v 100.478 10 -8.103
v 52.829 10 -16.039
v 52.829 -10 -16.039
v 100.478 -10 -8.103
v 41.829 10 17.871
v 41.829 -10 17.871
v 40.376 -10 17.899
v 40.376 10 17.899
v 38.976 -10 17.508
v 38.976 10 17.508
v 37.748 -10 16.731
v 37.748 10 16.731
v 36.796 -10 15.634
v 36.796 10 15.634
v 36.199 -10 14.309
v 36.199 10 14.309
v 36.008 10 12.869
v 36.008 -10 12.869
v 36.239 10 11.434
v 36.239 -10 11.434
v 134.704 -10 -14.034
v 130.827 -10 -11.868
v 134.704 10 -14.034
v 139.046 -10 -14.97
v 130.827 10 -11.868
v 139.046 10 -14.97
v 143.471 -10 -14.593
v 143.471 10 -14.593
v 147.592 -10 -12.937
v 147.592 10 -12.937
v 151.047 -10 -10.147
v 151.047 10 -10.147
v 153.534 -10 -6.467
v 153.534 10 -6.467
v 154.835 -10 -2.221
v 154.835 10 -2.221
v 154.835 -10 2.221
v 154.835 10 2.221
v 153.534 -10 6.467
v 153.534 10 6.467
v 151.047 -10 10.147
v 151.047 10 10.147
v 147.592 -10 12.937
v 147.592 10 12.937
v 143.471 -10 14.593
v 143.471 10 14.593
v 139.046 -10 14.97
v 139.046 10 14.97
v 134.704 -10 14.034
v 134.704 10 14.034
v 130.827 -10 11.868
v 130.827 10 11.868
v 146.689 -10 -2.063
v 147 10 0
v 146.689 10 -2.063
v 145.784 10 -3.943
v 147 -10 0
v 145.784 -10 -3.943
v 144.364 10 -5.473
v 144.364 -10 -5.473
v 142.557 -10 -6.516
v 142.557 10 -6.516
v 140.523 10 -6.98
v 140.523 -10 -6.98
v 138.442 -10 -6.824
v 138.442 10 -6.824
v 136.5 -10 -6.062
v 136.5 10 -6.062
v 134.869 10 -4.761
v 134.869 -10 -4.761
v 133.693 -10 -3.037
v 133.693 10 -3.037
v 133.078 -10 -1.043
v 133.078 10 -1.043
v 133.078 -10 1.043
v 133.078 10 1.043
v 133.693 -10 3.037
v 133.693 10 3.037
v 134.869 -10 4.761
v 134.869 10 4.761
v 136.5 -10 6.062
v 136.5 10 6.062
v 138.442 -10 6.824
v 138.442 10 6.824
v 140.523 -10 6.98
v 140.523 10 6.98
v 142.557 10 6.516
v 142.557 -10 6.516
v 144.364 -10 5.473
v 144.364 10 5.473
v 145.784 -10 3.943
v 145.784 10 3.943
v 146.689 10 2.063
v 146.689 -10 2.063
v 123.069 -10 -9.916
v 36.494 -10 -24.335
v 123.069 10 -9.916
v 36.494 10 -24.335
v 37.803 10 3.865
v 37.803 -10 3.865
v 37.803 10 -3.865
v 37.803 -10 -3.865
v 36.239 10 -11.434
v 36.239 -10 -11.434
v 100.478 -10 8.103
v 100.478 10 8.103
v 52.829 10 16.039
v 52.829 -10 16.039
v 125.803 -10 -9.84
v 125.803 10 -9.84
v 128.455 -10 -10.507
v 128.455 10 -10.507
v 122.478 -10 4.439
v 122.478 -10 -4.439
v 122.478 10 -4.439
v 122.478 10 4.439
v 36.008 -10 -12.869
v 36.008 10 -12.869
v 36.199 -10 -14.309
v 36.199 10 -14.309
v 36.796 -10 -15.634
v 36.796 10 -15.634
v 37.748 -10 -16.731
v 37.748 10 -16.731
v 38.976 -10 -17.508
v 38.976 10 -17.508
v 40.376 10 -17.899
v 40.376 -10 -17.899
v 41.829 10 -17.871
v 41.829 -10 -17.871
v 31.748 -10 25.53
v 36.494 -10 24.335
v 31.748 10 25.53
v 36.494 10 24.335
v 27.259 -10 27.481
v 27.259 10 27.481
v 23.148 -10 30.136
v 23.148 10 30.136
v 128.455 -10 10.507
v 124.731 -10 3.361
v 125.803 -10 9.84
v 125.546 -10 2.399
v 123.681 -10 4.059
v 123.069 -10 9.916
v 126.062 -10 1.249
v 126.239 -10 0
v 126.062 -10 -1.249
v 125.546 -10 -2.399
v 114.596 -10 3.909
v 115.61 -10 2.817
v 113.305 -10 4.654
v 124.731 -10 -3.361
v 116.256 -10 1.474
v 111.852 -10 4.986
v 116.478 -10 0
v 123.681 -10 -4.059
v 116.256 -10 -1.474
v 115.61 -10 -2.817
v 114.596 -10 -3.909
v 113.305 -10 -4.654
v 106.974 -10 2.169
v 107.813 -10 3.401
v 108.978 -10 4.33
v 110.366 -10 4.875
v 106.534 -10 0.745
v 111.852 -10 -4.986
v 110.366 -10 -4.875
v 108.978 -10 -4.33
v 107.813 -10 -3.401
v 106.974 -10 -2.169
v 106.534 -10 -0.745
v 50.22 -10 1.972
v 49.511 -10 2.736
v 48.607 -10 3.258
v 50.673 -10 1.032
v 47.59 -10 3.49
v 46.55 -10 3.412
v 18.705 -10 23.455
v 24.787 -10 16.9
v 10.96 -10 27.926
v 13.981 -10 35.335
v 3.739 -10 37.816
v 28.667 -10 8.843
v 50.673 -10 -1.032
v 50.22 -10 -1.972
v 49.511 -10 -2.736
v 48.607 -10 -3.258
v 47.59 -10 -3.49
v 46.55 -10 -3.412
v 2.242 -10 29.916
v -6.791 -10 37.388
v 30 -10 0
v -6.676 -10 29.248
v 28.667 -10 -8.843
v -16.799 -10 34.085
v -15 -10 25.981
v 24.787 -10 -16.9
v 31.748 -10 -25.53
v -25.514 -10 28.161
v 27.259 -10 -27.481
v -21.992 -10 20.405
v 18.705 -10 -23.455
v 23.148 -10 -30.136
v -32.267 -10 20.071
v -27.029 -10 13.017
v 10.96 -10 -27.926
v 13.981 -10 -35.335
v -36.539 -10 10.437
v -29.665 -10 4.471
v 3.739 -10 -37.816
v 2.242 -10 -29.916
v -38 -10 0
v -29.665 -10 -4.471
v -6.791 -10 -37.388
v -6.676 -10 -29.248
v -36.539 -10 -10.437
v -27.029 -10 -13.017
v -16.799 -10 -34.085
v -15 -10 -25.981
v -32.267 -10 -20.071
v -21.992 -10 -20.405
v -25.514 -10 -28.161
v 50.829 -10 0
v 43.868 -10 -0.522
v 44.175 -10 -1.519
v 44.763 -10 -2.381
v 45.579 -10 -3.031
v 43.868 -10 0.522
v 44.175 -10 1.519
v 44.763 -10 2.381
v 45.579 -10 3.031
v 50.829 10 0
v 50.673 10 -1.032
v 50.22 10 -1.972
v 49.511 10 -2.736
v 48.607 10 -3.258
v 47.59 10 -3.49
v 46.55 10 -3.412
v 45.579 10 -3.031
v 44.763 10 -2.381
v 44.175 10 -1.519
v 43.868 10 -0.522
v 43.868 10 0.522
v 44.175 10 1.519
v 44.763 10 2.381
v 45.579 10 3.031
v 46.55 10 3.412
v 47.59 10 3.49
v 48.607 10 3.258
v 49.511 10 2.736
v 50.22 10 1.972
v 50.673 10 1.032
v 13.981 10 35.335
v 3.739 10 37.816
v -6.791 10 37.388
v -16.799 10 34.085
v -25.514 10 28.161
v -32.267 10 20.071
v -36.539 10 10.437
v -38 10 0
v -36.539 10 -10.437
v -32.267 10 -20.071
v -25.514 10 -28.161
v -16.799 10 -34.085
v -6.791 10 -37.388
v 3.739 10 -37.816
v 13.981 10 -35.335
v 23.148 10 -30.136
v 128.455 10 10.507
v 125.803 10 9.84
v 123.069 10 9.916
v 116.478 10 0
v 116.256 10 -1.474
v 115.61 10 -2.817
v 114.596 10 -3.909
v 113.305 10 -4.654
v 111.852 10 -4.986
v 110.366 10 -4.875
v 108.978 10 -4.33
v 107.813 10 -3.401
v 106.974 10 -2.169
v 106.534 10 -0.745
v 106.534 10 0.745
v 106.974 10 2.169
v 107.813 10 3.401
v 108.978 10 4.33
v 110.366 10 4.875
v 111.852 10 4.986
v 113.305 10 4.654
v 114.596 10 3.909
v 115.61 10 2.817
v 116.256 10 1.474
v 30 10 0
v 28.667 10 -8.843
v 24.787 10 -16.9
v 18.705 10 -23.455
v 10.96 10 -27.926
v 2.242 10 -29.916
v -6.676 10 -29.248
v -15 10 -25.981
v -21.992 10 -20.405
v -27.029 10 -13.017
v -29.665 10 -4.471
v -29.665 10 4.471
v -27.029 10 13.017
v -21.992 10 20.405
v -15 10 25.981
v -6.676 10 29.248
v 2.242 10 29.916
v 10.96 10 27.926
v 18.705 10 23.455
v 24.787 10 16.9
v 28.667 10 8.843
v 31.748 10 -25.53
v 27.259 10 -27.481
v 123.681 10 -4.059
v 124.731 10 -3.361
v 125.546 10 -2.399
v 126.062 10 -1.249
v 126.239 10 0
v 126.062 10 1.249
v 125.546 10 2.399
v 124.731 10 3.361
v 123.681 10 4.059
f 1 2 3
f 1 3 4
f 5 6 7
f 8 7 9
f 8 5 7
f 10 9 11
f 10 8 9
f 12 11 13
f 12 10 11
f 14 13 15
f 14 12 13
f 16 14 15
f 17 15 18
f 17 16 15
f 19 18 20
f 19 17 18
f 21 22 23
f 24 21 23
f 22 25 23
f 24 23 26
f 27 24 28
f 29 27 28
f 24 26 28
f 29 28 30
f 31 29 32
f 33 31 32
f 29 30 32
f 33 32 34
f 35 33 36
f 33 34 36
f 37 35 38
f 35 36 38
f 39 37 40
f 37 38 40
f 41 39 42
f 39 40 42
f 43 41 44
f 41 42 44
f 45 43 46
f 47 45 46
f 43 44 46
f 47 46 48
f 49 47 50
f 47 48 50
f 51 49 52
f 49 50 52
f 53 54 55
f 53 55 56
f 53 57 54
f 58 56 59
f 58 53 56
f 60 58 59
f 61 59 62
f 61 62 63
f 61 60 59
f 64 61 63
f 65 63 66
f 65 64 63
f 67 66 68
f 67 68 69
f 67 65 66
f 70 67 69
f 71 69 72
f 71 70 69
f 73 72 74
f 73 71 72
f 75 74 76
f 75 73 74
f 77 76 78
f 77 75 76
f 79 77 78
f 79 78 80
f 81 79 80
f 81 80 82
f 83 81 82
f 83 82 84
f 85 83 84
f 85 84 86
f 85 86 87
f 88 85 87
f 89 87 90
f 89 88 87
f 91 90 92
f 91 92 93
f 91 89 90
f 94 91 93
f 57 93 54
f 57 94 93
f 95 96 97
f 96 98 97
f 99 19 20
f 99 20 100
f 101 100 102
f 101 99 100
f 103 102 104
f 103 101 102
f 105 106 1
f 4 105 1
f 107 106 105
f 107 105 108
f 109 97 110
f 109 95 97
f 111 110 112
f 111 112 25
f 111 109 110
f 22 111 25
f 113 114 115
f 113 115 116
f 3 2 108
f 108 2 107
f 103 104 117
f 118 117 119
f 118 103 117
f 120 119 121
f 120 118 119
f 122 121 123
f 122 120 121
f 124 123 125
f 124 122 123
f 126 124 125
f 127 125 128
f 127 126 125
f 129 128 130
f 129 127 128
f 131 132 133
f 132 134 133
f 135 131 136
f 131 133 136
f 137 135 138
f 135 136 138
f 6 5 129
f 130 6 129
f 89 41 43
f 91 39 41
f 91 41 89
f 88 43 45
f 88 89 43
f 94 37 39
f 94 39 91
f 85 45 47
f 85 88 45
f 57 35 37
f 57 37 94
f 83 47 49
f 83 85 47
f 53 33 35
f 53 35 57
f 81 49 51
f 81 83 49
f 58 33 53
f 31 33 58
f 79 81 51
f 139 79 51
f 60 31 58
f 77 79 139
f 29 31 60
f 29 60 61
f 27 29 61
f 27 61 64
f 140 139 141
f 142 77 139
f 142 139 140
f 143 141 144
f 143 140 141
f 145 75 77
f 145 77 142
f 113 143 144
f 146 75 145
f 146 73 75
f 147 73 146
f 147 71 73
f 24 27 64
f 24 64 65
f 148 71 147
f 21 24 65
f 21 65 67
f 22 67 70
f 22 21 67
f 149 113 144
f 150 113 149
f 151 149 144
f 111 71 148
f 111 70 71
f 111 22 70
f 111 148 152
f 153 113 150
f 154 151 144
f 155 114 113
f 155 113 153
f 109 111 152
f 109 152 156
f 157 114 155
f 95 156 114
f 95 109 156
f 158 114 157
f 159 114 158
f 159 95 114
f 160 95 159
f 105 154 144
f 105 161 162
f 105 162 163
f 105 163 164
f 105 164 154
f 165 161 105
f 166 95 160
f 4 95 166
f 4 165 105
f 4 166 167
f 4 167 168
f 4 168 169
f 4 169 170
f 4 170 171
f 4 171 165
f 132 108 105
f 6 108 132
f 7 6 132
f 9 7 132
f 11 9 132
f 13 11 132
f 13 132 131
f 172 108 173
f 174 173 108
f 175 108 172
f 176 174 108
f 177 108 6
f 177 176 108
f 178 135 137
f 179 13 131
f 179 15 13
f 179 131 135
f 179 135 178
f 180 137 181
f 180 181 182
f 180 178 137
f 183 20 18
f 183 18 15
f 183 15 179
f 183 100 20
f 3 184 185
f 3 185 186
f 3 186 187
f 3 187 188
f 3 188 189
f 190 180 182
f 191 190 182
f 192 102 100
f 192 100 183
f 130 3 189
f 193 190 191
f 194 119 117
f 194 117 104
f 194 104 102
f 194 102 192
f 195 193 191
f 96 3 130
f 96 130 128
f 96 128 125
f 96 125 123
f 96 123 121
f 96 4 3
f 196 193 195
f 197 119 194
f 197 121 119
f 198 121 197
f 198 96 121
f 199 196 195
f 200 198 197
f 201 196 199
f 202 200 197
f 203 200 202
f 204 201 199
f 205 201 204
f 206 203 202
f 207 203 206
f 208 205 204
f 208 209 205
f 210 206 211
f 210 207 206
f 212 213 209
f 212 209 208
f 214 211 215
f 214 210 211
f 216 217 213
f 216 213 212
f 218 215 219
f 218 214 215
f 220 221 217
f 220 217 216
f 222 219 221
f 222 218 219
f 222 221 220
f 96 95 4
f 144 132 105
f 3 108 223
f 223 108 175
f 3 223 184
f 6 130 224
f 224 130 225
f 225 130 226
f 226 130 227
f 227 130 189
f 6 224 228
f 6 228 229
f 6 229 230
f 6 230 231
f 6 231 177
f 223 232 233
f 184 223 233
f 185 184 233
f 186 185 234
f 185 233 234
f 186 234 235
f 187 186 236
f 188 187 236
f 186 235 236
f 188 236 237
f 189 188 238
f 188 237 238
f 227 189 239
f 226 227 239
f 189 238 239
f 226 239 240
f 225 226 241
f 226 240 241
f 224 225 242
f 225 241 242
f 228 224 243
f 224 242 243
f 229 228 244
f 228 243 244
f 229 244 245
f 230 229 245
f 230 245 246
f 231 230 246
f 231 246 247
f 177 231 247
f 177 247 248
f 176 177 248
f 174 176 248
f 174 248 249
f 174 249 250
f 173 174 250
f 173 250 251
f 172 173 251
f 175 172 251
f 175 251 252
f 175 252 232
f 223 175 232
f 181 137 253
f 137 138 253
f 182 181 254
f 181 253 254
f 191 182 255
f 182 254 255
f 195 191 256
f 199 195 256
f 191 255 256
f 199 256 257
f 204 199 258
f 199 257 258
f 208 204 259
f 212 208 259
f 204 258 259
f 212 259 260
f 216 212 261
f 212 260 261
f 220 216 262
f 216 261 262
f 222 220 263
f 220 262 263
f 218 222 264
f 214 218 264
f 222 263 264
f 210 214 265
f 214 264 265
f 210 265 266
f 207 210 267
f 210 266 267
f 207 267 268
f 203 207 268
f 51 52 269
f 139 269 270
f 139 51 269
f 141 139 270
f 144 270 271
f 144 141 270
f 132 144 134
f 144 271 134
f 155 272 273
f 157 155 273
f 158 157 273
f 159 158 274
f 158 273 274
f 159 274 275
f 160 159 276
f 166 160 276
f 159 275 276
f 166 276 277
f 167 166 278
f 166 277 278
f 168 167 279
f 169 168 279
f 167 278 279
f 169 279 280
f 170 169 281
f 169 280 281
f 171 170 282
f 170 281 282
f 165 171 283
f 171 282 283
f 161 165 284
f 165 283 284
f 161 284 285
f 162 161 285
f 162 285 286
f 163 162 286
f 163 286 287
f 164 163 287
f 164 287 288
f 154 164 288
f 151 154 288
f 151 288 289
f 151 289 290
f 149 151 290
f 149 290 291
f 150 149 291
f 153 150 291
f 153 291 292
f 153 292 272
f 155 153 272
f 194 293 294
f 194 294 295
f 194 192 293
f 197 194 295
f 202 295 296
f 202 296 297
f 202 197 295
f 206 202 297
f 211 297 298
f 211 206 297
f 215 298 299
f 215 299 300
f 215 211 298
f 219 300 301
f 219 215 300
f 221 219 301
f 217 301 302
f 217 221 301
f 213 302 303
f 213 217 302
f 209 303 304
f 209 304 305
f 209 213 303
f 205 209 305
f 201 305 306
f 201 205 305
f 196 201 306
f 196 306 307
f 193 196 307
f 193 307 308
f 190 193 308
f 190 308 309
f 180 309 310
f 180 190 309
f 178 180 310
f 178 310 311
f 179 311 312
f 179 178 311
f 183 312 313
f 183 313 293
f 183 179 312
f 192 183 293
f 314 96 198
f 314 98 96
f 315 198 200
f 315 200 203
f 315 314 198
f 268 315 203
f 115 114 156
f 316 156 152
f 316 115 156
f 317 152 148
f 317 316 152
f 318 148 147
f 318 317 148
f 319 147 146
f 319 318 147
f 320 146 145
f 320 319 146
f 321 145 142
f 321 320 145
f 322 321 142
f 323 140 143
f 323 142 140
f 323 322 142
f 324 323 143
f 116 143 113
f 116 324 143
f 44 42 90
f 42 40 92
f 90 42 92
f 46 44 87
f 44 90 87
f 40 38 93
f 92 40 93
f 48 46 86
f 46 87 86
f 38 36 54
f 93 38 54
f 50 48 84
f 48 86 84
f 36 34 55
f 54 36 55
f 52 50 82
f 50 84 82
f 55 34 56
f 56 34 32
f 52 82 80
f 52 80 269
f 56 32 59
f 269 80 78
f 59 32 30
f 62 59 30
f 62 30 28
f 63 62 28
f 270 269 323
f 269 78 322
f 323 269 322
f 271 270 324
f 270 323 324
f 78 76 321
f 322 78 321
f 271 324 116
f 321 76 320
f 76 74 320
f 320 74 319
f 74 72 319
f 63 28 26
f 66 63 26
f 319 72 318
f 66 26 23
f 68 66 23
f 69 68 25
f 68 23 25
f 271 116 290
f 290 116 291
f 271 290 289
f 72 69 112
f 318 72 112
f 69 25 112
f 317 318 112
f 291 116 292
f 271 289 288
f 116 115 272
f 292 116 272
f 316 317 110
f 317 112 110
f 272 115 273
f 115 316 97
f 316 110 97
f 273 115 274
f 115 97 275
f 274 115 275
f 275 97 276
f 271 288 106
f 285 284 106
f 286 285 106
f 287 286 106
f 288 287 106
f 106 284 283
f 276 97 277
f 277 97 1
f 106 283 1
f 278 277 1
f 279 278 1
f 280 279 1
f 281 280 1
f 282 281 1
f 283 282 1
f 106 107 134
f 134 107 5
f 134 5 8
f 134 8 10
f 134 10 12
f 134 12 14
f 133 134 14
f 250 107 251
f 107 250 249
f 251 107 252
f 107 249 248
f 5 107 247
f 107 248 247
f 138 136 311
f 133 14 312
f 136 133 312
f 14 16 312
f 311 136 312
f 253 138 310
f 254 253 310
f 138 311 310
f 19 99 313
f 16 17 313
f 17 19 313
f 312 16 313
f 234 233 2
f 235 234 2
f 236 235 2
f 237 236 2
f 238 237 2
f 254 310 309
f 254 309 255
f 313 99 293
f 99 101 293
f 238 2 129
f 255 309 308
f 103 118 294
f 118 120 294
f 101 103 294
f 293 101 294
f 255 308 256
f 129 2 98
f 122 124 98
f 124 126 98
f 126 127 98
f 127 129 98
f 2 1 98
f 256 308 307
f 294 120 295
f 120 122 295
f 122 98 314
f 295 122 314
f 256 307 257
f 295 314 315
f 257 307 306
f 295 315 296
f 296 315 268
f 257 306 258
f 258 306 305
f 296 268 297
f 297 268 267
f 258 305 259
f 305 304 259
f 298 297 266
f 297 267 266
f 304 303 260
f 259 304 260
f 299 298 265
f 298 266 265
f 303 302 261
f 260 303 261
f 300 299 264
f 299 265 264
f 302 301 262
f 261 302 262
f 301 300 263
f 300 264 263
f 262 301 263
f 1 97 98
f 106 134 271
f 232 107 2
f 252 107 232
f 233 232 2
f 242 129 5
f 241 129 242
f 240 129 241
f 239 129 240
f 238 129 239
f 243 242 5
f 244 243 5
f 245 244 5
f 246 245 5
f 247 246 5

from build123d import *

# Parameters (mm, degrees)
SKETCH1_R           = 30
SKETCH1_R_2         = 7
BOSS_EXTRUDE1_DEPTH = 10
FILLET1_R           = 30
FILLET2_R           = 10
CUT_EXTRUDE1_DEPTH  = 21
BOSS_EXTRUDE2_DEPTH = 20
SKETCH4_R           = 3.5
SKETCH4_R_2         = 5
CUT_EXTRUDE2_DEPTH  = 21


with BuildPart() as part:
    # Sketch1 → Boss-Extrude1 (new body, symmetric)
    with BuildSketch(Plane(origin=(0, 0, 0), x_dir=(1, 0, 0), z_dir=(0, 1, 0))):
        with BuildLine():
            Line((27.935473676, 25.760615491), (128.063755469, 9.084385863))
            ThreePointArc((128.063755469, 9.084385863), (155, 0), (128.063755469, -9.084385863))
            Line((128.063755469, -9.084385863), (27.935473676, -25.760615491))
            ThreePointArc((27.935473676, -25.760615491), (-38, 0), (27.935473676, 25.760615491))
        make_face()
        Circle(SKETCH1_R, mode=Mode.SUBTRACT)
        with Locations((140, 0)):
            Circle(SKETCH1_R_2, mode=Mode.SUBTRACT)
    extrude(amount=BOSS_EXTRUDE1_DEPTH, both=True)

    # Fillet1
    fillet1_edges = [part.edges().sort_by_distance(p)[0] for p in [
        (27.935473676, 0, 25.760615491),
        (27.935473676, 0, -25.760615491),
    ]]
    fillet(fillet1_edges, radius=FILLET1_R)

    # Fillet2
    fillet2_edges = [part.edges().sort_by_distance(p)[0] for p in [
        (128.063755469, 0, 9.084385863),
        (128.063755469, 0, -9.084385863),
    ]]
    fillet(fillet2_edges, radius=FILLET2_R)

    # Sketch2 → Cut-Extrude1 (cut, through all)
    with BuildSketch(Plane(origin=(0, 10, 0), x_dir=(1, 0, 0), z_dir=(0, 1, 0))):
        with BuildLine():
            Line((41.828554558, 17.870982725), (122.478416149, 4.438857582))
            ThreePointArc((122.478416149, 4.438857582), (126.239130435, 0), (122.478416149, -4.438857582))
            Line((122.478416149, -4.438857582), (41.828554558, -17.870982725))
            ThreePointArc((41.828554558, -17.870982725), (37.231968897, -16.217361812), (36.238855523, -11.43439331))
            ThreePointArc((36.238855523, -11.43439331), (38, 0), (36.238855523, 11.43439331))
            ThreePointArc((36.238855523, 11.43439331), (37.231968897, 16.217361812), (41.828554558, 17.870982725))
        make_face()
    extrude(amount=-CUT_EXTRUDE1_DEPTH, mode=Mode.SUBTRACT)

    # Sketch3 → Boss-Extrude2 (add)
    with BuildSketch(Plane(origin=(0, 10, 0), x_dir=(1, 0, 0), z_dir=(0, 1, 0))):
        Polygon((100.478416149, 8.102927765), (122.478416149, 4.438857582), (122.478416149, -4.438857582), (100.478416149, -8.102927765), align=None)
        Polygon((41.828554558, 17.870982725), (52.828554558, 16.038947633), (52.828554558, -16.038947633), (41.828554558, -17.870982725), align=None)
    extrude(amount=-BOSS_EXTRUDE2_DEPTH)

    # Sketch4 → Cut-Extrude2 (cut, through all)
    with BuildSketch(Plane(origin=(0, 10, 0), x_dir=(1, 0, 0), z_dir=(0, 1, 0))):
        with Locations((47.328554558, 0)):
            Circle(SKETCH4_R)
        with Locations((111.478416149, 0)):
            Circle(SKETCH4_R_2)
    extrude(amount=-CUT_EXTRUDE2_DEPTH, mode=Mode.SUBTRACT)


solid = part.part
